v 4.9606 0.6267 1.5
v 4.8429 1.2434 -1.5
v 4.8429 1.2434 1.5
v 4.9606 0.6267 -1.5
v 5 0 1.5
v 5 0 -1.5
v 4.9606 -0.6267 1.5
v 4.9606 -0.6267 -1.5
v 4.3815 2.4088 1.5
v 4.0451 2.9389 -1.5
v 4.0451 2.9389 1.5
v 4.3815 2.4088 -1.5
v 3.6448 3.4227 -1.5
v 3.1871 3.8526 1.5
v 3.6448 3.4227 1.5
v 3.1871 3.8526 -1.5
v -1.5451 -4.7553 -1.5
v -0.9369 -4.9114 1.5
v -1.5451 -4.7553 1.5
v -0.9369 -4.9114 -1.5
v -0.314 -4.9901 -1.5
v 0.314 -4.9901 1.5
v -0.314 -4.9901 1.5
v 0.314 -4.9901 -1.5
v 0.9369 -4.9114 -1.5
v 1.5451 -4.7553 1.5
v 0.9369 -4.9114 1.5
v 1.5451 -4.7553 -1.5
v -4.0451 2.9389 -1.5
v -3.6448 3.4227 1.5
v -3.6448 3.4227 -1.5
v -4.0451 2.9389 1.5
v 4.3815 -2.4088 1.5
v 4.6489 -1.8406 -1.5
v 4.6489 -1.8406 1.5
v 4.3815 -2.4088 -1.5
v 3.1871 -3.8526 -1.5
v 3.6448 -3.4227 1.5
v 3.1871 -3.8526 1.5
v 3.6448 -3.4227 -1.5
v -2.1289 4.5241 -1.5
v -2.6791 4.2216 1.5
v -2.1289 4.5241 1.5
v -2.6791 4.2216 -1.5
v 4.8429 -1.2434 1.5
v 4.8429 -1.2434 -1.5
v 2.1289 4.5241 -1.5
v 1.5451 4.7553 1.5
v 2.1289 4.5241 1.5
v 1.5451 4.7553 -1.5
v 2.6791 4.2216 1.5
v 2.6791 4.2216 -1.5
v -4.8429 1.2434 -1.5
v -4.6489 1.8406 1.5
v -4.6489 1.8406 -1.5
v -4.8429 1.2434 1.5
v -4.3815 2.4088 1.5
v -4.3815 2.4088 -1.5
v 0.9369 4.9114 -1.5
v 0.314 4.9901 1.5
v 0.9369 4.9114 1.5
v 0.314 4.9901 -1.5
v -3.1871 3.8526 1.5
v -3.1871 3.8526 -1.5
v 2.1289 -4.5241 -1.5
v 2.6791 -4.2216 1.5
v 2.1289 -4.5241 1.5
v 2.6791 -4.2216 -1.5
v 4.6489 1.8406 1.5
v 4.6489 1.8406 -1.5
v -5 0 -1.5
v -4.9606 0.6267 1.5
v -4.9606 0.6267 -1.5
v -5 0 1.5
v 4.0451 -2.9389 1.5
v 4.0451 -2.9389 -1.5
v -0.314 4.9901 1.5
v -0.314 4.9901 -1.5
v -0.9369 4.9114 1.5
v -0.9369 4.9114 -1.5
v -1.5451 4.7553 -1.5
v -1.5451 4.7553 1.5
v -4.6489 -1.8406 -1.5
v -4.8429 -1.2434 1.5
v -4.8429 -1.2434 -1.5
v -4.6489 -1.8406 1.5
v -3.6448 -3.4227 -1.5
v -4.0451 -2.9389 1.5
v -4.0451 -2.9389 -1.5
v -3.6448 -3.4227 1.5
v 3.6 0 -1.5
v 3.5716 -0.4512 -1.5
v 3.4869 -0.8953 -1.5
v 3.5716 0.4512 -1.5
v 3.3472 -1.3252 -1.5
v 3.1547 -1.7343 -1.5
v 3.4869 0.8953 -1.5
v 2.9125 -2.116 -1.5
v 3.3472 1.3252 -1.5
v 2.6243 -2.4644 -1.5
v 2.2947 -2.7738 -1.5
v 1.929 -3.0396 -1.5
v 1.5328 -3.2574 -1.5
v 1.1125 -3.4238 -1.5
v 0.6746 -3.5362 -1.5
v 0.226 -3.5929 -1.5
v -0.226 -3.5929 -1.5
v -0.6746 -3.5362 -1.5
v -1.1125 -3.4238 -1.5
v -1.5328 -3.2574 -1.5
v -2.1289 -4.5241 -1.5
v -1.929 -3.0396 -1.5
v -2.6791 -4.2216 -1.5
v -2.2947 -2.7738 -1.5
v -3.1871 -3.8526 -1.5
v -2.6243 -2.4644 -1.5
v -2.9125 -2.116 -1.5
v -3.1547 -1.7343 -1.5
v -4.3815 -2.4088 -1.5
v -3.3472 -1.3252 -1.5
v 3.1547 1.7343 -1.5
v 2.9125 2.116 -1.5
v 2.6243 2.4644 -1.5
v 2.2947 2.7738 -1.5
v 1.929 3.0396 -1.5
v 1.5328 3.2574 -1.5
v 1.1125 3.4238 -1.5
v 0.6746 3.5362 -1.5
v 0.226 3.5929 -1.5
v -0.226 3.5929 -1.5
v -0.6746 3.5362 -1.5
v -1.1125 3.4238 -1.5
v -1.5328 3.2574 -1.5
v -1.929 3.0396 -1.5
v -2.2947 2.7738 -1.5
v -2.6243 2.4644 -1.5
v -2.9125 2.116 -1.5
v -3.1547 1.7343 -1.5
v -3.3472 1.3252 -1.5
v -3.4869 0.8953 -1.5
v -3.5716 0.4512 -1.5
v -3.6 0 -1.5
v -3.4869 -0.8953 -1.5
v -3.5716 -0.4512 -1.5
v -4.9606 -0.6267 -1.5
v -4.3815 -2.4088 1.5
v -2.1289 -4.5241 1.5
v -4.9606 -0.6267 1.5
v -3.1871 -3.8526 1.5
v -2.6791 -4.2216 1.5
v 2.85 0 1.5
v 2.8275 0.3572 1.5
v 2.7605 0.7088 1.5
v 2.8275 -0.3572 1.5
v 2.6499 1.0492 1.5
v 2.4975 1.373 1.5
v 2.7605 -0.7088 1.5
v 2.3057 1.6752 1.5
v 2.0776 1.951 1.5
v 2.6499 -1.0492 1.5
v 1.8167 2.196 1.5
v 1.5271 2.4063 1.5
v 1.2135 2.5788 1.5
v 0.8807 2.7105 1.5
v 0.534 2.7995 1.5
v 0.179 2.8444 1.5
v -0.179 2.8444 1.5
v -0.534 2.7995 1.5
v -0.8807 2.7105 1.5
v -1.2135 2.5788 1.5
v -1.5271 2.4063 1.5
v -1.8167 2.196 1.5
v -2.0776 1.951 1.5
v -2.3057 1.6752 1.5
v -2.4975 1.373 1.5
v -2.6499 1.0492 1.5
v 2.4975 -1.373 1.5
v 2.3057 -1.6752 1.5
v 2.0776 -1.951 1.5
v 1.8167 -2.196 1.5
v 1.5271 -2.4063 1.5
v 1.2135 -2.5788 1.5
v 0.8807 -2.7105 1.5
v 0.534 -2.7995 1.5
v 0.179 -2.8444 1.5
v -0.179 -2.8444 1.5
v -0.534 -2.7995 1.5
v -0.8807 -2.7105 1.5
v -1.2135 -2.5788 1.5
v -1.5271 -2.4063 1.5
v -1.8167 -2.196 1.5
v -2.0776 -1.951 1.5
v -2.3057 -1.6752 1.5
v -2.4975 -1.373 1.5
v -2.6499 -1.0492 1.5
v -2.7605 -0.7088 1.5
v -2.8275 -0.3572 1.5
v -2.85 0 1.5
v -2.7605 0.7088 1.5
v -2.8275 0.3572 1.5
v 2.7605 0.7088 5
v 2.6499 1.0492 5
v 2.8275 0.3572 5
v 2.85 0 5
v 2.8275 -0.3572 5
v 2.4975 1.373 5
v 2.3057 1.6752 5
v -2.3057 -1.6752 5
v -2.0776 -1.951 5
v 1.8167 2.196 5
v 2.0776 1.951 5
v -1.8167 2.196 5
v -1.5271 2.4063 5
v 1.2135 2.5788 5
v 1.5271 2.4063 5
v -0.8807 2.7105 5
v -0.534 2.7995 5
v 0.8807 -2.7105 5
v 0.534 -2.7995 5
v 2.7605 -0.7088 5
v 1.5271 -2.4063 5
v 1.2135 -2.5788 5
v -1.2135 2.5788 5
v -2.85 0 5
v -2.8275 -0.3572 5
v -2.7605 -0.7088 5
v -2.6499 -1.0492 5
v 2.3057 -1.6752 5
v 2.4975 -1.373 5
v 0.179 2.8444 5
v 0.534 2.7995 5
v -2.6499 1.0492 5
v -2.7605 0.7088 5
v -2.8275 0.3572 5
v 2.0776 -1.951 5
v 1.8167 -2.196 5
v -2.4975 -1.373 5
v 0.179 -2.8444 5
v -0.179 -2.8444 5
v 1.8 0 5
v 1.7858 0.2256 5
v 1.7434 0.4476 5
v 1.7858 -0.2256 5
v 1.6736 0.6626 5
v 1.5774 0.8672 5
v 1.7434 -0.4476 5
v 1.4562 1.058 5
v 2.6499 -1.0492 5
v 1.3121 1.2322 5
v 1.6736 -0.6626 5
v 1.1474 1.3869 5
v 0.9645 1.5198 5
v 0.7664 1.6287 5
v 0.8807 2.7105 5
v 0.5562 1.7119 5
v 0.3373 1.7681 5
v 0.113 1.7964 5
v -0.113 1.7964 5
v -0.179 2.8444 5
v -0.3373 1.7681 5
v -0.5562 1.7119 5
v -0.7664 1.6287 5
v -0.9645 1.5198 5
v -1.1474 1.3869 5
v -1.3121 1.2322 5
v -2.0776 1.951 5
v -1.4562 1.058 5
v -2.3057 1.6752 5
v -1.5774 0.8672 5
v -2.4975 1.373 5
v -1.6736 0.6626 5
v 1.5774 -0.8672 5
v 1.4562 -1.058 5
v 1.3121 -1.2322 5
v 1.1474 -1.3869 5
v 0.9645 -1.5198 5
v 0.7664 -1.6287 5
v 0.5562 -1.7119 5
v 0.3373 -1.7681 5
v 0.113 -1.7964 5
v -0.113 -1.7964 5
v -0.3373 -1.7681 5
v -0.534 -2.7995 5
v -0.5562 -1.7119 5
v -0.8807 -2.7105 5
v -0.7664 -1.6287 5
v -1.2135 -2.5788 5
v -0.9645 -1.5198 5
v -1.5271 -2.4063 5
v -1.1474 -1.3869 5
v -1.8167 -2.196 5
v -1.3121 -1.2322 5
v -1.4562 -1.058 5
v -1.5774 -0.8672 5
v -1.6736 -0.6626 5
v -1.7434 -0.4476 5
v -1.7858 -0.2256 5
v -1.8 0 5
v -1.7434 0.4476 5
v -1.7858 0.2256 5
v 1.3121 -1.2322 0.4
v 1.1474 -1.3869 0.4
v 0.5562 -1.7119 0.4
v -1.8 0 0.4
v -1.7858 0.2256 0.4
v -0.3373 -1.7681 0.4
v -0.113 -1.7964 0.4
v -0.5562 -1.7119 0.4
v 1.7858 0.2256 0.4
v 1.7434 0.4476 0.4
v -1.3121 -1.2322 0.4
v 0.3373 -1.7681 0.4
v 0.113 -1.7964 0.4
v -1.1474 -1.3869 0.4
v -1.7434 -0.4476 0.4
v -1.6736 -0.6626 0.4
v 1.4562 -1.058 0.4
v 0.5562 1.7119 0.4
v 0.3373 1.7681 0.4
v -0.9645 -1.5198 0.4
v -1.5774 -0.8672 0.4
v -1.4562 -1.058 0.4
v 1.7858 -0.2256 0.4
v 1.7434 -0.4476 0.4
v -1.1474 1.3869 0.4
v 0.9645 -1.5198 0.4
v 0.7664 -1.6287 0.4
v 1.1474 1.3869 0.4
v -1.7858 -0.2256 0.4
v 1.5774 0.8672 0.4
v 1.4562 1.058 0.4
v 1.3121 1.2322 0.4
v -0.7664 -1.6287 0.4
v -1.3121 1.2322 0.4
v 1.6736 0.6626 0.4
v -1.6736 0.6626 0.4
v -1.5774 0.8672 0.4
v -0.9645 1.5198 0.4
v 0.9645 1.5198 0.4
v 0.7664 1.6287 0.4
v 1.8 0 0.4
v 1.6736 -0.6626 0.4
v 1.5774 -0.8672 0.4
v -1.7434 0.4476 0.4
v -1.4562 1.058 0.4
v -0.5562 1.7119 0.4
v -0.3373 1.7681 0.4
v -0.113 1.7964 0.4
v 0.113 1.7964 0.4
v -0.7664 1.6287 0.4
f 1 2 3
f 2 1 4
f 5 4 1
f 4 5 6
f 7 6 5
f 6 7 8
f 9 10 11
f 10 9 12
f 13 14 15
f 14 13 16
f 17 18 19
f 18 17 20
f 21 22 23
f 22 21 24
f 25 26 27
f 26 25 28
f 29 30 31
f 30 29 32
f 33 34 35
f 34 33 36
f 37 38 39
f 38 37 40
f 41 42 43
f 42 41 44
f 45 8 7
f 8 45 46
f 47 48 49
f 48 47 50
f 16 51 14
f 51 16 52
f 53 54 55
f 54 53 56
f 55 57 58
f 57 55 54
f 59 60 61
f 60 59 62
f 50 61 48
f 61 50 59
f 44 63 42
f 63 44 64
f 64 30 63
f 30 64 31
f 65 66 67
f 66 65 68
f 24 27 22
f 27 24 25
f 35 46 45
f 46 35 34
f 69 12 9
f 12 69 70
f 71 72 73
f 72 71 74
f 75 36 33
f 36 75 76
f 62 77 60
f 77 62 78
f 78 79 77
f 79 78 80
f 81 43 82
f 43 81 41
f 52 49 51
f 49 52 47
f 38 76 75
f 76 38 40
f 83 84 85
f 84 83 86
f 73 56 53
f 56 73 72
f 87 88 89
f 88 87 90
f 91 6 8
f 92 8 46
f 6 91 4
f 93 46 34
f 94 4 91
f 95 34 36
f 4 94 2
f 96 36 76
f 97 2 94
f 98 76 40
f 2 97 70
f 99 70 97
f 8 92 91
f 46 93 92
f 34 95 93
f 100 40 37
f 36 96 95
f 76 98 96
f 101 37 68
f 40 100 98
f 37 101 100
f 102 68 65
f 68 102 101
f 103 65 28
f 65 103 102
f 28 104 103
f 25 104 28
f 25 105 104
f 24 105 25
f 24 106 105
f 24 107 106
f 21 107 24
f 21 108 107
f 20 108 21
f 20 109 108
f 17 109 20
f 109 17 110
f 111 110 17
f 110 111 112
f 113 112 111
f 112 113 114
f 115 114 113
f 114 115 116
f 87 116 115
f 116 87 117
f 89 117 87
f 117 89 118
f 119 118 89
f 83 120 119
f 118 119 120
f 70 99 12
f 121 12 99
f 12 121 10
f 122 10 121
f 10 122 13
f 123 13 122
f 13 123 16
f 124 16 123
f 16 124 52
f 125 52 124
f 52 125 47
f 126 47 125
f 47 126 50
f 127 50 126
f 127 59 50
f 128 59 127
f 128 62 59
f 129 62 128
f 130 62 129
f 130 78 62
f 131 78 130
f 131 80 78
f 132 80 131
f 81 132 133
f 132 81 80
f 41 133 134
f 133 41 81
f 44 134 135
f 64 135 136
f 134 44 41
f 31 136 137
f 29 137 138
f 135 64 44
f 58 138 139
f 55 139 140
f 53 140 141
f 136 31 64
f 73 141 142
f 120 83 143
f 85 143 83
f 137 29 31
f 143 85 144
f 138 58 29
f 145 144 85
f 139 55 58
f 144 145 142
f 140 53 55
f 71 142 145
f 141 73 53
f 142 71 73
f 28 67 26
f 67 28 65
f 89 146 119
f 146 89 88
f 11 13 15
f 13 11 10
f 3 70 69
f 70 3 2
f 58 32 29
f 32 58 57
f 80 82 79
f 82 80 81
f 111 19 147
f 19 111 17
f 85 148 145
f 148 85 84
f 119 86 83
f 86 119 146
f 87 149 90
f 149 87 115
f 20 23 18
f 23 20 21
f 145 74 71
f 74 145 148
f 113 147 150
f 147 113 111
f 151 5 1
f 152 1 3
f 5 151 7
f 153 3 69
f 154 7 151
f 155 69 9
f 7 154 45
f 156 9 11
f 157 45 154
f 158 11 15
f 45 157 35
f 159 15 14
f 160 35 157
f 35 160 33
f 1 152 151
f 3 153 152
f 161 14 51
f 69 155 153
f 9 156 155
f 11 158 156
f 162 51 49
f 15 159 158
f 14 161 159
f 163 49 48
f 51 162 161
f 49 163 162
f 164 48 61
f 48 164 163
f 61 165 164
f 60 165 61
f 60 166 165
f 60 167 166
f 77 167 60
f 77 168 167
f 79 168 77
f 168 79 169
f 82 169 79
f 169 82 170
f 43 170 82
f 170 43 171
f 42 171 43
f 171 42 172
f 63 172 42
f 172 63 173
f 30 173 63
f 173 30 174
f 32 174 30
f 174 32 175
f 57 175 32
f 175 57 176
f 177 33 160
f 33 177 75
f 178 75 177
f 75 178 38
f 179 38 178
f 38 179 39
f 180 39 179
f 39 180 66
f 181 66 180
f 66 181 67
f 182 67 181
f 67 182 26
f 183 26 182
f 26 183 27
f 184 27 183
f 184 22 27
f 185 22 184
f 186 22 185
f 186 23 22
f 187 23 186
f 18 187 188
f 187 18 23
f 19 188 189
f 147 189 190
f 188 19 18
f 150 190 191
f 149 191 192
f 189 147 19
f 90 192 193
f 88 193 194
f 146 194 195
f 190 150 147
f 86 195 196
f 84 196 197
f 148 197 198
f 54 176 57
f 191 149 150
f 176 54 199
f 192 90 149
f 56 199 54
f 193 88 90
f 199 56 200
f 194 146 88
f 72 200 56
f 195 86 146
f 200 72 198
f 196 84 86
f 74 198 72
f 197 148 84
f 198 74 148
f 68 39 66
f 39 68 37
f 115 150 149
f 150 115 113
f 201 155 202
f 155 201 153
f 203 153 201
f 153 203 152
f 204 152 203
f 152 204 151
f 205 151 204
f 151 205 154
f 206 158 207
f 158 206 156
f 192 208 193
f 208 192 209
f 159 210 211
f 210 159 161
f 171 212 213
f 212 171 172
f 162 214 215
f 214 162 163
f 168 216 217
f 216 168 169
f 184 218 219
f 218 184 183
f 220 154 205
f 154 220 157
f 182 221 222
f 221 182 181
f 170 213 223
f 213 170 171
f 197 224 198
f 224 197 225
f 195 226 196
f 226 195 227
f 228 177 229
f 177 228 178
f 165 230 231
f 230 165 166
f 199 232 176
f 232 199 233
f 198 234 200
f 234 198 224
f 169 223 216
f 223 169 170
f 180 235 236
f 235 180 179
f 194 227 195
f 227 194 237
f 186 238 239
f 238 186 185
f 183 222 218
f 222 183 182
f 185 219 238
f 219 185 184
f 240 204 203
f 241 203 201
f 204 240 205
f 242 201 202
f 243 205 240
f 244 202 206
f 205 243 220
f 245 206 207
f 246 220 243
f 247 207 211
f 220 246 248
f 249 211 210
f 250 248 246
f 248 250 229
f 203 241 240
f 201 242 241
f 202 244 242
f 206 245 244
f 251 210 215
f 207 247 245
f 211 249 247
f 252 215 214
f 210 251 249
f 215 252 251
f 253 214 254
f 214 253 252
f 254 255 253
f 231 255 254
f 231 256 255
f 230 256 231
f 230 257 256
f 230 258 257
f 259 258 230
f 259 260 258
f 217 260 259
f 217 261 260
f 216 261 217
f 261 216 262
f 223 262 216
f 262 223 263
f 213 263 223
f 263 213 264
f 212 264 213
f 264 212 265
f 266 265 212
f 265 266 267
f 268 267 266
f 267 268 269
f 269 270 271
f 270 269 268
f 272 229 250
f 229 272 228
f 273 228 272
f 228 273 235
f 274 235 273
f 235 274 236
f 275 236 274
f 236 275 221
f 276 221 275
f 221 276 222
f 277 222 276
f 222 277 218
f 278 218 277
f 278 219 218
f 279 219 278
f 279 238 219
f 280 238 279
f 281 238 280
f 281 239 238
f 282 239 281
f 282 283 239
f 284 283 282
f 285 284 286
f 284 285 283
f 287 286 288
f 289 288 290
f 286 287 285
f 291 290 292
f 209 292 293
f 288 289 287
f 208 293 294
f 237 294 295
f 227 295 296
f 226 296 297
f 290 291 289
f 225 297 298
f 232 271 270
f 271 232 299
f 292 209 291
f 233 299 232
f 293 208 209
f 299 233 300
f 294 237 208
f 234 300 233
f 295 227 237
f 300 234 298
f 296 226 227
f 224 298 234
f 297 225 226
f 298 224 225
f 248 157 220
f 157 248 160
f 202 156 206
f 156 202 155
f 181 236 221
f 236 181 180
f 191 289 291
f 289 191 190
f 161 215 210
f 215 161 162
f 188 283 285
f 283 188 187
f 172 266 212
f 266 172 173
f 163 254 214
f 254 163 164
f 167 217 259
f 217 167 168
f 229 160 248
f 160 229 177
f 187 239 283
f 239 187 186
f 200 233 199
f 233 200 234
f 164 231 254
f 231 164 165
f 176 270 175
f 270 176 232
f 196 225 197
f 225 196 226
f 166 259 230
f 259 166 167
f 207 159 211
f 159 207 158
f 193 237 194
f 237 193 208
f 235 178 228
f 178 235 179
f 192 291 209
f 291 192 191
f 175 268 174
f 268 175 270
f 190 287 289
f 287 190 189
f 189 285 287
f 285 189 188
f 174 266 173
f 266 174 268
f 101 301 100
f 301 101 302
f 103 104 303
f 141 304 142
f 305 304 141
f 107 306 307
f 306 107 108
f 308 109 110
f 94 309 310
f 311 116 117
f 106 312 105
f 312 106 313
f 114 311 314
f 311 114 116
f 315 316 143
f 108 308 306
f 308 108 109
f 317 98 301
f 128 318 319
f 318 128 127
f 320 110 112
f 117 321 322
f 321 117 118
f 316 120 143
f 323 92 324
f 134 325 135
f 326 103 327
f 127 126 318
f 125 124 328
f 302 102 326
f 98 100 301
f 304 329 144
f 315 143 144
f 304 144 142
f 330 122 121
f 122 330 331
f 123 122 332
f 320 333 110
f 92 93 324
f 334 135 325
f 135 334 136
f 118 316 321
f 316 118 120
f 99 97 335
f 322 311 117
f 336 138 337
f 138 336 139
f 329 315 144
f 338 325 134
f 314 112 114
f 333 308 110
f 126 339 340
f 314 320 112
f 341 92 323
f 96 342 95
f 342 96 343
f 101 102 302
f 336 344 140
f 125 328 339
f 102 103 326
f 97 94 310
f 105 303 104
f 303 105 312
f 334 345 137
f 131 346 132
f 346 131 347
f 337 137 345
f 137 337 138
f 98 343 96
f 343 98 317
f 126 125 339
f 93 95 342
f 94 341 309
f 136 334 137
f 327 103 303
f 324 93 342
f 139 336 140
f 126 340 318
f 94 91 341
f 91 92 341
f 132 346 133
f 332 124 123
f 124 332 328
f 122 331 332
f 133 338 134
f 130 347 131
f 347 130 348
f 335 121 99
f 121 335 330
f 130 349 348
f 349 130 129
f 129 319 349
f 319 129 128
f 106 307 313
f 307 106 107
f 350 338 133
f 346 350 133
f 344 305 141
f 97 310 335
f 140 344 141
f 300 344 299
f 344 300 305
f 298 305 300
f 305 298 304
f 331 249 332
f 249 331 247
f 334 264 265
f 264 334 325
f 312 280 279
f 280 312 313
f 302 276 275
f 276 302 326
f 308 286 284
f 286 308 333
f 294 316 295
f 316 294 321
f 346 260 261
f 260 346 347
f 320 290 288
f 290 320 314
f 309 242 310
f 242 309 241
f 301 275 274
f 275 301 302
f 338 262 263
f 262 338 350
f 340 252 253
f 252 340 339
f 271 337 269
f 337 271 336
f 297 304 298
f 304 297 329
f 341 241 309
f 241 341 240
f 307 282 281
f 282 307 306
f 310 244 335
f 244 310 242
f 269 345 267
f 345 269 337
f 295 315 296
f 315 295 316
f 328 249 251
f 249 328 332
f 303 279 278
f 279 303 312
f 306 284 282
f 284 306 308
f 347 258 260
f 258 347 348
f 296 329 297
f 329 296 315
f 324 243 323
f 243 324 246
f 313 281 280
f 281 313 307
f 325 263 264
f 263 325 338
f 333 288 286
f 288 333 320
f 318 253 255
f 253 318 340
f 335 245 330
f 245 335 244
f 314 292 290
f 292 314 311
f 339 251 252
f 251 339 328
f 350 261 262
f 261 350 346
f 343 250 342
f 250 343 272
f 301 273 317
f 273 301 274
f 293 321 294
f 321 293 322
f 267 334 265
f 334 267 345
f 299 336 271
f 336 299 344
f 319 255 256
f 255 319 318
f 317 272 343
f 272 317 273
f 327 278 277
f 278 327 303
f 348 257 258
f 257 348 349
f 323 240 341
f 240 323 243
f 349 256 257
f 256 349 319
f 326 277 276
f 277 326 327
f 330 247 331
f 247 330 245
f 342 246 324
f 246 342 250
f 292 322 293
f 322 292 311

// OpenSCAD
$fn = 50;


difference() {
	union() {
		translate(v = [0, 0, -1.5000000000]) {
			cylinder(h = 3, r = 5.0000000000);
		}
		translate(v = [0, 0, -1.5000000000]) {
			cylinder(h = 6.5000000000, r = 2.8500000000);
		}
	}
	union() {
		translate(v = [0, 0, -1.5000000000]) {
			rotate(a = [0, 180, 0]) {
				difference() {
					union() {
						translate(v = [0, 0, -6.5000000000]) {
							cylinder(h = 6.5000000000, r = 1.5000000000);
						}
						translate(v = [0, 0, -1.9000000000]) {
							cylinder(h = 1.9000000000, r1 = 1.8000000000, r2 = 3.6000000000);
						}
						translate(v = [0, 0, -6.5000000000]) {
							cylinder(h = 6.5000000000, r = 1.8000000000);
						}
						translate(v = [0, 0, -6.5000000000]) {
							cylinder(h = 6.5000000000, r = 1.5000000000);
						}
					}
					union();
				}
			}
		}
		translate(v = [0, 0, -50.0000000000]) {
			cylinder(h = 100, r = 1.8000000000);
		}
	}
}
